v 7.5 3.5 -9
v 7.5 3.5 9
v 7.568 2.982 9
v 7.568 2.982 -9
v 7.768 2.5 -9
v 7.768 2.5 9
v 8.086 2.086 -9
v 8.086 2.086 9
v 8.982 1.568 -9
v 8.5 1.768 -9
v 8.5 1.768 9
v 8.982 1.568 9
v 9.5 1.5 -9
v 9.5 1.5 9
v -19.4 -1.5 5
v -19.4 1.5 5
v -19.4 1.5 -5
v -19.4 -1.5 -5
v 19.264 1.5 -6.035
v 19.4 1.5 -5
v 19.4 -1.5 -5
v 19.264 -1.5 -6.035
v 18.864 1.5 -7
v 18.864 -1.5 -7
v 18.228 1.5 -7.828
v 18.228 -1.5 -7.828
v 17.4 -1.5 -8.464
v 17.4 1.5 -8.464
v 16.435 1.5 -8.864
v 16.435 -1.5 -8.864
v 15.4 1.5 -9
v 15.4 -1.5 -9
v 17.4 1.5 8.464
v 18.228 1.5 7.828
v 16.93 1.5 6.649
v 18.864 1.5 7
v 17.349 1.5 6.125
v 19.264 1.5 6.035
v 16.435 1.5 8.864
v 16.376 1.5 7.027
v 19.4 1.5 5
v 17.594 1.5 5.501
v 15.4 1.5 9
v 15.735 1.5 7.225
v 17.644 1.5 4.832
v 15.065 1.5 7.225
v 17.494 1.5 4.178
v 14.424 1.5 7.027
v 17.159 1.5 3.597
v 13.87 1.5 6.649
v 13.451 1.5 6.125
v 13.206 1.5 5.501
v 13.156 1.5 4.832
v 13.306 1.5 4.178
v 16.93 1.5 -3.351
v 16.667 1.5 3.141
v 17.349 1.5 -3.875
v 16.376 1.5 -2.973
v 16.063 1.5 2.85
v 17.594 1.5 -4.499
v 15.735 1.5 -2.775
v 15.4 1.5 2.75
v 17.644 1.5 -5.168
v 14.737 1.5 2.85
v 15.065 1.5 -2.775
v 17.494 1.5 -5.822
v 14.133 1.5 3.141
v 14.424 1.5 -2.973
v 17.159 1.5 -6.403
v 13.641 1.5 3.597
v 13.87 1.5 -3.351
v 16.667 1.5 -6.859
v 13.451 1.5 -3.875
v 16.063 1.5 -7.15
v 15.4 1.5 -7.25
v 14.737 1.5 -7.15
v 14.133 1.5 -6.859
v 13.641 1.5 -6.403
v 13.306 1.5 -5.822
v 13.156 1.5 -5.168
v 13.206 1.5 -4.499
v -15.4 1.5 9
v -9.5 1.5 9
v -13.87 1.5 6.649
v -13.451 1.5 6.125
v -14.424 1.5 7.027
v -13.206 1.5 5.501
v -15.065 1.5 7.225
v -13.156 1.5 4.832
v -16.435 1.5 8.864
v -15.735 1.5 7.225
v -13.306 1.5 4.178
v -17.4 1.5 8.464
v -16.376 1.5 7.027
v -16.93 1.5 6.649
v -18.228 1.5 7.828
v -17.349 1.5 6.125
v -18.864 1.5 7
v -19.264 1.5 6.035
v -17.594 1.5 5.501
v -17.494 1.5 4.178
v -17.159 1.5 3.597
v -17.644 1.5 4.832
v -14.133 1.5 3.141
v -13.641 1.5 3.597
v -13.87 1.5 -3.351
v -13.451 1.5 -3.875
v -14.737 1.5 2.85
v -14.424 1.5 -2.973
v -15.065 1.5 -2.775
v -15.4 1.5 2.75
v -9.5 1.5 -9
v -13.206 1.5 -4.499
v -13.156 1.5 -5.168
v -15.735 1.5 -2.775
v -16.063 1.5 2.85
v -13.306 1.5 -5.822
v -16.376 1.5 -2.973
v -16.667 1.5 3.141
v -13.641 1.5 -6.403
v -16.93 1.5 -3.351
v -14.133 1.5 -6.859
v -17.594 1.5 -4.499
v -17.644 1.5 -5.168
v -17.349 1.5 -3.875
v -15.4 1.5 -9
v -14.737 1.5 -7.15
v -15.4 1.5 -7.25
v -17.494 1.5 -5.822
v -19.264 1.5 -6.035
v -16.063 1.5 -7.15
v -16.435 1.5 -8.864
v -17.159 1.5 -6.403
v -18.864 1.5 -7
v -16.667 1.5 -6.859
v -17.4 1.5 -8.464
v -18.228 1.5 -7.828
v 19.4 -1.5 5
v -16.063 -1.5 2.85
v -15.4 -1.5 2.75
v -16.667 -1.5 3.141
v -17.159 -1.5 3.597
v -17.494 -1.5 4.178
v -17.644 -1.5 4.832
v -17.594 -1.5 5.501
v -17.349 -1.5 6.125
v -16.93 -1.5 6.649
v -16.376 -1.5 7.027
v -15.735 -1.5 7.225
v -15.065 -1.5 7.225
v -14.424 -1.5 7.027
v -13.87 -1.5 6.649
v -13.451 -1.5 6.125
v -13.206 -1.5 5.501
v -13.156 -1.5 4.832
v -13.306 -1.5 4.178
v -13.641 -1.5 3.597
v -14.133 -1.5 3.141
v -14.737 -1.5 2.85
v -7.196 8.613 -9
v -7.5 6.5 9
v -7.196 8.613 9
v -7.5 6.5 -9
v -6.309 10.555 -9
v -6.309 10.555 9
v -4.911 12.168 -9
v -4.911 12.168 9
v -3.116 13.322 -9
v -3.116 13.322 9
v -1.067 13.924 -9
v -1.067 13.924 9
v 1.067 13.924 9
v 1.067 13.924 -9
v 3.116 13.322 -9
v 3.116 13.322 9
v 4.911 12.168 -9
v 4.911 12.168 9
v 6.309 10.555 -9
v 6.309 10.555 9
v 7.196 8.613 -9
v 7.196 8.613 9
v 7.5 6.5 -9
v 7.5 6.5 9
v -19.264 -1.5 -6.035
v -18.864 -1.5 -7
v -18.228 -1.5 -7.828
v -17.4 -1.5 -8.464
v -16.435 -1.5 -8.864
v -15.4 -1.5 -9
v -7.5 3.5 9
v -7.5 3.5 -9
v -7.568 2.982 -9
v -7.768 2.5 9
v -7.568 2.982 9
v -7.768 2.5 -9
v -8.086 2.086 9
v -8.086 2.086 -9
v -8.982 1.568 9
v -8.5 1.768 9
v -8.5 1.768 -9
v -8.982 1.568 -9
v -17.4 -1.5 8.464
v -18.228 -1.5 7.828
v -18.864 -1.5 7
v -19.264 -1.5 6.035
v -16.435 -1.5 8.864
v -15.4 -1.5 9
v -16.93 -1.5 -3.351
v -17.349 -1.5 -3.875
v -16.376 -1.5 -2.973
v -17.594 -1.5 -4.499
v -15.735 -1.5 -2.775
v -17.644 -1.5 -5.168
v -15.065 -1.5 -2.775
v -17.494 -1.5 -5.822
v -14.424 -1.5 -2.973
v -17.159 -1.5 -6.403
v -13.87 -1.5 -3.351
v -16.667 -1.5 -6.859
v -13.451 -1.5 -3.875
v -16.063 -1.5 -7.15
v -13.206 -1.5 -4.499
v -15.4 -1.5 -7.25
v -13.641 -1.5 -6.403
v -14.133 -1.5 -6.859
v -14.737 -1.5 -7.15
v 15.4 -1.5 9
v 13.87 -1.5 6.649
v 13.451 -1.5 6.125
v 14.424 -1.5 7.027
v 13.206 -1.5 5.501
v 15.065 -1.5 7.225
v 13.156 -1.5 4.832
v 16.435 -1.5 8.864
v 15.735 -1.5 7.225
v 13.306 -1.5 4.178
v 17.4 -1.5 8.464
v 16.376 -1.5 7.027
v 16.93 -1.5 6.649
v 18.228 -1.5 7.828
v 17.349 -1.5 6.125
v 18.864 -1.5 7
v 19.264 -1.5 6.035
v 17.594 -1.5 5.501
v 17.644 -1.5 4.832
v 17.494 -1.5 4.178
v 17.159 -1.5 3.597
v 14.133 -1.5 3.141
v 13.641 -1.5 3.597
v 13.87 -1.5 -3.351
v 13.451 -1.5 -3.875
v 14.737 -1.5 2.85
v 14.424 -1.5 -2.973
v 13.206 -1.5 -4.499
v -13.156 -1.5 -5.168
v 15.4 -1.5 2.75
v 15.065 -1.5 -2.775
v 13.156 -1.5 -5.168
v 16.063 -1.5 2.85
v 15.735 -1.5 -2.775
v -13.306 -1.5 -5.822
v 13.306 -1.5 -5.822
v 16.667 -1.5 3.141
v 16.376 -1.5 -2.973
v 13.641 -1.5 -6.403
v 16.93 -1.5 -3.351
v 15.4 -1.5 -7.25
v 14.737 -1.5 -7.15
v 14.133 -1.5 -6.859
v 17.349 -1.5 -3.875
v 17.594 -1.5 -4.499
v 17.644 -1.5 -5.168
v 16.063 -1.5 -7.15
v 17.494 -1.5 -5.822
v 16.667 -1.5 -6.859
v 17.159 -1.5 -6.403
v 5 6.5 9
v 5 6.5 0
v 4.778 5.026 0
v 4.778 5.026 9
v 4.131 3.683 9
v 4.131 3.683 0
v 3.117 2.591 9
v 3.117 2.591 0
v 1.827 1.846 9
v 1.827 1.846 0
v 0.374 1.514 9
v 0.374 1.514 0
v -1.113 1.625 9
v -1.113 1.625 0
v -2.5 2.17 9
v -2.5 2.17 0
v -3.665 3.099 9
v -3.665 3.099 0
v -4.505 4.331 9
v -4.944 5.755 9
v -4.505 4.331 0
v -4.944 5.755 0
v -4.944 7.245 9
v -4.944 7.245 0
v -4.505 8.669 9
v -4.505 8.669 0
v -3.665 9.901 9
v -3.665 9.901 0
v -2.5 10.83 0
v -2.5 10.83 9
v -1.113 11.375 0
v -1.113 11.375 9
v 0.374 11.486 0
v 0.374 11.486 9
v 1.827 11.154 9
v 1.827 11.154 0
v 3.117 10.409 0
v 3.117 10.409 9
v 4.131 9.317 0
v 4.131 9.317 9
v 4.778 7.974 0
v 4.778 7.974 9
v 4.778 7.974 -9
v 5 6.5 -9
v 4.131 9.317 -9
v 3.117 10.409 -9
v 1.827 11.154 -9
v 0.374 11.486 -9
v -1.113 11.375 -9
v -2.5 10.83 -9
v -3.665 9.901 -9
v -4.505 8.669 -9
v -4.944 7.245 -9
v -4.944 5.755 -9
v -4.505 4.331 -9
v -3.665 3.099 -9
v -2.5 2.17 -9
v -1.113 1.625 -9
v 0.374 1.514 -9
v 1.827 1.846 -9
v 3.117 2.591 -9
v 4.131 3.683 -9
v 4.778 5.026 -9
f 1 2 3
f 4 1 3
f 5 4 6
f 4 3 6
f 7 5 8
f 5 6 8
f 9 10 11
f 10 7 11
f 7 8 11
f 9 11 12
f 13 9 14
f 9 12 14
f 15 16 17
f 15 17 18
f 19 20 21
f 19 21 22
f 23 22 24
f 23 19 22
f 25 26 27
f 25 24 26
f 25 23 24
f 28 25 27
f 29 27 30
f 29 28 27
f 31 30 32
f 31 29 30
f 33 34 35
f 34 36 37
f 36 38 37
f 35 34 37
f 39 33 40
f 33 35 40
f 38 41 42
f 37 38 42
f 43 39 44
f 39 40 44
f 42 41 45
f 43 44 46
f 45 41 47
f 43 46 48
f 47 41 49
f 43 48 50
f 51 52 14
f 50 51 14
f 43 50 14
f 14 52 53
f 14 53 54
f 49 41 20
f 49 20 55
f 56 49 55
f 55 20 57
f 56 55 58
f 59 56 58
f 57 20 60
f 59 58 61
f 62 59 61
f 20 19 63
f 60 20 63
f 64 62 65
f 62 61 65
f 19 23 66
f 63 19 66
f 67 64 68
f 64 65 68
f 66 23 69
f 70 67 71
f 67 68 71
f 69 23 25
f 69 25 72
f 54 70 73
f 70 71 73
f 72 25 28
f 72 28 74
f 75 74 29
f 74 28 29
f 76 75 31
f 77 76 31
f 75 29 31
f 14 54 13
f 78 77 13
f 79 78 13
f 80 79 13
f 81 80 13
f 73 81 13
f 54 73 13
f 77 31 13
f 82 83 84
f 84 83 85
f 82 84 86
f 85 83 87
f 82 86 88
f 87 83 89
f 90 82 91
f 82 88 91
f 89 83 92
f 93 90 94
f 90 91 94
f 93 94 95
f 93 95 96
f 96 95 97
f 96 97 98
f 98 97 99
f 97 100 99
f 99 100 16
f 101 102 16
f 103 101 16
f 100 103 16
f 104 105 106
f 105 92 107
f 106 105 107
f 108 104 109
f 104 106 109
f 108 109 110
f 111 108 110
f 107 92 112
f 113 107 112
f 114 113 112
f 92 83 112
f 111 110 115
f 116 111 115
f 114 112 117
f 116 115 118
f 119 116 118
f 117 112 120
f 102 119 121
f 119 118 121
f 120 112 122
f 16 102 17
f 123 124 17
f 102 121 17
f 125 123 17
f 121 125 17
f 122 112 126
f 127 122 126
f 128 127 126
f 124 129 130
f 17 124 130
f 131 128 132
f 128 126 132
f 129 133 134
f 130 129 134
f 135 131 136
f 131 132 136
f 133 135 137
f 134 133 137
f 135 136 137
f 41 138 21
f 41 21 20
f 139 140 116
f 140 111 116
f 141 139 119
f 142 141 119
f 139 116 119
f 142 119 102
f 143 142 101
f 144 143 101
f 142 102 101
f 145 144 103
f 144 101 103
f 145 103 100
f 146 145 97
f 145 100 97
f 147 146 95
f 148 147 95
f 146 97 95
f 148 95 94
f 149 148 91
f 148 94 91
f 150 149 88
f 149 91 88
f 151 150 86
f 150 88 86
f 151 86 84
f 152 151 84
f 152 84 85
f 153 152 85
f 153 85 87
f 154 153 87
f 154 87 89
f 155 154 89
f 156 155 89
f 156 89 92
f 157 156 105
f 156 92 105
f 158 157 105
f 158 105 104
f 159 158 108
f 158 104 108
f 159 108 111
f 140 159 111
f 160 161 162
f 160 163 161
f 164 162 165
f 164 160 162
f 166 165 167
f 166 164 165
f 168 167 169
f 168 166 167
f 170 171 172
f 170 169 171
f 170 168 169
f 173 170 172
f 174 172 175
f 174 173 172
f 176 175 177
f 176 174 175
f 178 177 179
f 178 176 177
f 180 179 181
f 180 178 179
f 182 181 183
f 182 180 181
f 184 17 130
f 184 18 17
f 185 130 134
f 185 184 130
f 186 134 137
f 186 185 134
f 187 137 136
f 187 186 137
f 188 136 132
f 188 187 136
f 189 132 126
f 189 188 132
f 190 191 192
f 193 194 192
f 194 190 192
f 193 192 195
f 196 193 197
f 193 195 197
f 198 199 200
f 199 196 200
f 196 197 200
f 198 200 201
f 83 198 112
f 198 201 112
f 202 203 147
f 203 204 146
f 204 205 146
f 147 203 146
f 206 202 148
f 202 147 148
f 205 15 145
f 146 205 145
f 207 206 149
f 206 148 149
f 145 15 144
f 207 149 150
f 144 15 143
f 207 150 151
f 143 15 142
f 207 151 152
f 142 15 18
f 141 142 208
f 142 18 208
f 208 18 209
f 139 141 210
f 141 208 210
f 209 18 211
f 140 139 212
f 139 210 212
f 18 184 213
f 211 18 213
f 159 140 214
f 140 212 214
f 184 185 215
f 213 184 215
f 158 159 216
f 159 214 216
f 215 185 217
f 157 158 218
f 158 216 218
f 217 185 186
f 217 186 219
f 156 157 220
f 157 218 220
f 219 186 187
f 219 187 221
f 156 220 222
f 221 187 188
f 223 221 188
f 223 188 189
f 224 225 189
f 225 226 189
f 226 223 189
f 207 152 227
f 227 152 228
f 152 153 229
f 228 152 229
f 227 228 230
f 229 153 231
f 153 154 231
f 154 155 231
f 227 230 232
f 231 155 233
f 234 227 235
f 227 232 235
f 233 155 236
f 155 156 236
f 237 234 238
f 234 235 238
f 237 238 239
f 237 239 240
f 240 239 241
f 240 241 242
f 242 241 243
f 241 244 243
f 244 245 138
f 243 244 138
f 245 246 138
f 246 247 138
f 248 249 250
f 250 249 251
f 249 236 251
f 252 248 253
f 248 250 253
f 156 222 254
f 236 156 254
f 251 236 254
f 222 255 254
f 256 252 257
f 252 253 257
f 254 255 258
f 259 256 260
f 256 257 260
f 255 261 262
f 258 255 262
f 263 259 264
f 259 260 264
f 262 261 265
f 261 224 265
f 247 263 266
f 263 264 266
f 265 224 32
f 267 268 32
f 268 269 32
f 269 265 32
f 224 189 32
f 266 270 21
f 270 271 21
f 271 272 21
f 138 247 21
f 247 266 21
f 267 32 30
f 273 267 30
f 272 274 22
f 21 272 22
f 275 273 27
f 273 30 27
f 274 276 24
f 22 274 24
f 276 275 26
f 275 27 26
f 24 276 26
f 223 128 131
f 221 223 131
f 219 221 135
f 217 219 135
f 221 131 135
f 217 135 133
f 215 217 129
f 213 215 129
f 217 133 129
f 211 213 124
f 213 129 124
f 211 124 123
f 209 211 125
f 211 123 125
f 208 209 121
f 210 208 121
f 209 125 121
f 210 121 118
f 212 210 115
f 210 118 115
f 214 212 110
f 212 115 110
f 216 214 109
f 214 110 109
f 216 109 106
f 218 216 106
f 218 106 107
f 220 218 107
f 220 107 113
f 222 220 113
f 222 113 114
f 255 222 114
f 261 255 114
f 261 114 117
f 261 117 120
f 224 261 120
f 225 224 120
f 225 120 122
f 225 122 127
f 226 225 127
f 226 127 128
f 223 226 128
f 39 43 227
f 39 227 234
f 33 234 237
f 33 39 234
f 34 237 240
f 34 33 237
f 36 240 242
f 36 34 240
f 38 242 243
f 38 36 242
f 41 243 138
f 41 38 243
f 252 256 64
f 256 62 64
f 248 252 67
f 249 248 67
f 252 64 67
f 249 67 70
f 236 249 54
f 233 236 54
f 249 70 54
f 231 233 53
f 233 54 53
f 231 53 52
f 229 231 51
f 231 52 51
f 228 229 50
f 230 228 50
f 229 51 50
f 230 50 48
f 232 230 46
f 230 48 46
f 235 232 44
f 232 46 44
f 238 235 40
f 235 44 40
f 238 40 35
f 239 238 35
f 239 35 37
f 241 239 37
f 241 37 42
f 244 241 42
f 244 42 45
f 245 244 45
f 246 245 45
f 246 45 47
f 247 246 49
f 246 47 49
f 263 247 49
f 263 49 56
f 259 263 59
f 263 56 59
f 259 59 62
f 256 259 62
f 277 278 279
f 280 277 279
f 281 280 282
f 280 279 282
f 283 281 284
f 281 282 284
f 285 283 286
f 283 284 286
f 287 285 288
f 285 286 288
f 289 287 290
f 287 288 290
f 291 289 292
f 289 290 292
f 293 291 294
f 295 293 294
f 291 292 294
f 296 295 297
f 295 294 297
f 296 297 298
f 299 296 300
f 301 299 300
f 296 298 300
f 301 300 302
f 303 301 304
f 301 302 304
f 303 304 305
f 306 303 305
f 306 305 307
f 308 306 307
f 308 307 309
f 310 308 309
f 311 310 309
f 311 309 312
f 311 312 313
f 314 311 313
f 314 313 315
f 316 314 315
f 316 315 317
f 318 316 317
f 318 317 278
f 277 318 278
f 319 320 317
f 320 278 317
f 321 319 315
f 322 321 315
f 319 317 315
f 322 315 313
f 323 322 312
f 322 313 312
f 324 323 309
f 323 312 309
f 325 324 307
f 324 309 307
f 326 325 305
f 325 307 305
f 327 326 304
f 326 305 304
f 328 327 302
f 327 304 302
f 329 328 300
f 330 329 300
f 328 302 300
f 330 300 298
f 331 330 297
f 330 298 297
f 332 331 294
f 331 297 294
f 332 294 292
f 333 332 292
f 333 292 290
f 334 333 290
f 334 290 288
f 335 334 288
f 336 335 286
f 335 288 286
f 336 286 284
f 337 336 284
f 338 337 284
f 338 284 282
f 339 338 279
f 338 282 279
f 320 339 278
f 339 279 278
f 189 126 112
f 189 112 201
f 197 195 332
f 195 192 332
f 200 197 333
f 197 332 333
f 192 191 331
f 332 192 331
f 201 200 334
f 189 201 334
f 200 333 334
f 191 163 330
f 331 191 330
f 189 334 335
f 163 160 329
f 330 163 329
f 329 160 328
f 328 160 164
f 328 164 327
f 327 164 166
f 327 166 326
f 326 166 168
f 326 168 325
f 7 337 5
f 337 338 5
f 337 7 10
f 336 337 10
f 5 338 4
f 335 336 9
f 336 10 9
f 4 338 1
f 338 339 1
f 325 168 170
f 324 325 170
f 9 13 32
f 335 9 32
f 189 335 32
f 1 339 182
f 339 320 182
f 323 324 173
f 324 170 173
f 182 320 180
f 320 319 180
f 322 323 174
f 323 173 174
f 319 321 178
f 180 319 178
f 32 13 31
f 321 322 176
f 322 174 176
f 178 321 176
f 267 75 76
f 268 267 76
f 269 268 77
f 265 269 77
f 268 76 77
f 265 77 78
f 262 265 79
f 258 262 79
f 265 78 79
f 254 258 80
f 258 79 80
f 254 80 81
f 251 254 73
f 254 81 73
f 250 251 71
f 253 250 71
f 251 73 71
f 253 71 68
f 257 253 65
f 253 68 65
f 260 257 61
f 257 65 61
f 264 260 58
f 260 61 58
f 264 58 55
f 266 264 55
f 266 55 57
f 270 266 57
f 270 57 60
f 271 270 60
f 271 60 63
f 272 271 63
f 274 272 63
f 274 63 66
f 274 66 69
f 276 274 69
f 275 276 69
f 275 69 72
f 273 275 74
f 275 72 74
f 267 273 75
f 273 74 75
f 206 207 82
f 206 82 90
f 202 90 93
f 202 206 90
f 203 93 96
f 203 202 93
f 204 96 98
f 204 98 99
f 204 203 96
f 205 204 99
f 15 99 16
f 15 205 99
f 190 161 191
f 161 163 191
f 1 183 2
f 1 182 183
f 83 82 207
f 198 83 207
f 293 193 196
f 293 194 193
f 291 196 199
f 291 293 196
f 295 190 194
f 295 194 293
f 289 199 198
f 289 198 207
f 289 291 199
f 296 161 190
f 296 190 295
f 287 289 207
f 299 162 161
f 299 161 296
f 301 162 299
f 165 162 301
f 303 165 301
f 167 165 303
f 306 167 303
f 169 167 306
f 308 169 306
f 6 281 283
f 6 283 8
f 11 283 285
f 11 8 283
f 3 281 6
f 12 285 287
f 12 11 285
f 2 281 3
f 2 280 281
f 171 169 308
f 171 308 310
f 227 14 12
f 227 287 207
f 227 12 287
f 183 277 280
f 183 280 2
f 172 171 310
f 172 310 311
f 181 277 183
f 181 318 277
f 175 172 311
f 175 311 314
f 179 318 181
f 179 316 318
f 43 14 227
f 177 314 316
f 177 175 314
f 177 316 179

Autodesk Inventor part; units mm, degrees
ref_plane "YZ Plane" through (0, 0, 0) normal (1, 0, 0) x (0, 1, 0)
ref_plane "XZ Plane" through (0, 0, 0) normal (0, 1, 0) x (-1, 0, 0)
ref_plane "XY Plane" through (0, 0, 0) normal (0, 0, 1) x (1, 0, 0)
sketch "スケッチ1" plane through (0, 0, 0) normal (0, 0, 1) x (1, 0, 0)
  line L0 (-19.4, -1.5) -> (19.4, -1.5)
  line L1 (19.4, -1.5) -> (19.4, 1.5)
  line L2 (19.4, 1.5) -> (-19.4, 1.5)
  line L3 (-19.4, 1.5) -> (-19.4, -1.5)
  line L4 (-19.4, -1.5) -> (19.4, 1.5) construction
  line L5 (19.4, -1.5) -> (-19.4, 1.5) construction
  circle A0 centre (0, 6.5) radius 5
  circle A1 centre (0, 6.5) radius 7.5
  line L6 (-7.5, 6.5) -> (-7.5, 1.5)
  line L7 (7.5, 6.5) -> (7.5, 1.5)
  point P0 (0, 0)
  point P1 (0, 0)
  point P2 (0, 0)
  point P3 (0, 0)
  dimension "d4" = 10
  dimension "d5" = 3
  dimension "d6" = 38.8
  dimension "d21" = 15
extrude "押し出し1" add sketch "スケッチ1" along normal mid plane 18
fillet "フィレット1" radius 2 2 edges at (7.5, 1.5, 0) (-7.5, 1.5, 0)
sketch "スケッチ2" plane through (-19.4, -1.5, 9) normal (0, -1, 0) x (1, 0, 0)
  line L0 (4, -14) -> (34.8, -14)
  line L1 (34.8, -14) -> (34.8, -4)
  line L2 (34.8, -4) -> (4, -4)
  line L3 (4, -4) -> (4, -14)
  line L4 (4, -14) -> (34.8, -4) construction
  line L5 (34.8, -14) -> (4, -4) construction
  point P0 (19.4, -9)
  dimension "d11" = 30.8
  dimension "d12" = 10
hole "穴1" at (15.4, -1.5, 5) at (15.4, -1.5, -5) at (-15.4, -1.5, 5) at (-15.4, -1.5, -5) direction (0, 1, 0) diameter 4.5 end through all clearance for "Flat Head Machine Screw" size "M4" standard "Ansi Metric M Profile"
fillet "フィレット2" radius 4 4 edges at (-19.4, 0, -9) (-19.4, 0, 9) (19.4, 0, -9) (19.4, 0, 9)
ref_plane "作業平面2" through (0, -1.5, 5) normal (-1, 0, 0) x (0, 0, 1)
ref_plane "作業平面1" through (9.5, 0, 9) normal (0, 1, 0) x (1, 0, 0)
properties part number "scara-base26"
